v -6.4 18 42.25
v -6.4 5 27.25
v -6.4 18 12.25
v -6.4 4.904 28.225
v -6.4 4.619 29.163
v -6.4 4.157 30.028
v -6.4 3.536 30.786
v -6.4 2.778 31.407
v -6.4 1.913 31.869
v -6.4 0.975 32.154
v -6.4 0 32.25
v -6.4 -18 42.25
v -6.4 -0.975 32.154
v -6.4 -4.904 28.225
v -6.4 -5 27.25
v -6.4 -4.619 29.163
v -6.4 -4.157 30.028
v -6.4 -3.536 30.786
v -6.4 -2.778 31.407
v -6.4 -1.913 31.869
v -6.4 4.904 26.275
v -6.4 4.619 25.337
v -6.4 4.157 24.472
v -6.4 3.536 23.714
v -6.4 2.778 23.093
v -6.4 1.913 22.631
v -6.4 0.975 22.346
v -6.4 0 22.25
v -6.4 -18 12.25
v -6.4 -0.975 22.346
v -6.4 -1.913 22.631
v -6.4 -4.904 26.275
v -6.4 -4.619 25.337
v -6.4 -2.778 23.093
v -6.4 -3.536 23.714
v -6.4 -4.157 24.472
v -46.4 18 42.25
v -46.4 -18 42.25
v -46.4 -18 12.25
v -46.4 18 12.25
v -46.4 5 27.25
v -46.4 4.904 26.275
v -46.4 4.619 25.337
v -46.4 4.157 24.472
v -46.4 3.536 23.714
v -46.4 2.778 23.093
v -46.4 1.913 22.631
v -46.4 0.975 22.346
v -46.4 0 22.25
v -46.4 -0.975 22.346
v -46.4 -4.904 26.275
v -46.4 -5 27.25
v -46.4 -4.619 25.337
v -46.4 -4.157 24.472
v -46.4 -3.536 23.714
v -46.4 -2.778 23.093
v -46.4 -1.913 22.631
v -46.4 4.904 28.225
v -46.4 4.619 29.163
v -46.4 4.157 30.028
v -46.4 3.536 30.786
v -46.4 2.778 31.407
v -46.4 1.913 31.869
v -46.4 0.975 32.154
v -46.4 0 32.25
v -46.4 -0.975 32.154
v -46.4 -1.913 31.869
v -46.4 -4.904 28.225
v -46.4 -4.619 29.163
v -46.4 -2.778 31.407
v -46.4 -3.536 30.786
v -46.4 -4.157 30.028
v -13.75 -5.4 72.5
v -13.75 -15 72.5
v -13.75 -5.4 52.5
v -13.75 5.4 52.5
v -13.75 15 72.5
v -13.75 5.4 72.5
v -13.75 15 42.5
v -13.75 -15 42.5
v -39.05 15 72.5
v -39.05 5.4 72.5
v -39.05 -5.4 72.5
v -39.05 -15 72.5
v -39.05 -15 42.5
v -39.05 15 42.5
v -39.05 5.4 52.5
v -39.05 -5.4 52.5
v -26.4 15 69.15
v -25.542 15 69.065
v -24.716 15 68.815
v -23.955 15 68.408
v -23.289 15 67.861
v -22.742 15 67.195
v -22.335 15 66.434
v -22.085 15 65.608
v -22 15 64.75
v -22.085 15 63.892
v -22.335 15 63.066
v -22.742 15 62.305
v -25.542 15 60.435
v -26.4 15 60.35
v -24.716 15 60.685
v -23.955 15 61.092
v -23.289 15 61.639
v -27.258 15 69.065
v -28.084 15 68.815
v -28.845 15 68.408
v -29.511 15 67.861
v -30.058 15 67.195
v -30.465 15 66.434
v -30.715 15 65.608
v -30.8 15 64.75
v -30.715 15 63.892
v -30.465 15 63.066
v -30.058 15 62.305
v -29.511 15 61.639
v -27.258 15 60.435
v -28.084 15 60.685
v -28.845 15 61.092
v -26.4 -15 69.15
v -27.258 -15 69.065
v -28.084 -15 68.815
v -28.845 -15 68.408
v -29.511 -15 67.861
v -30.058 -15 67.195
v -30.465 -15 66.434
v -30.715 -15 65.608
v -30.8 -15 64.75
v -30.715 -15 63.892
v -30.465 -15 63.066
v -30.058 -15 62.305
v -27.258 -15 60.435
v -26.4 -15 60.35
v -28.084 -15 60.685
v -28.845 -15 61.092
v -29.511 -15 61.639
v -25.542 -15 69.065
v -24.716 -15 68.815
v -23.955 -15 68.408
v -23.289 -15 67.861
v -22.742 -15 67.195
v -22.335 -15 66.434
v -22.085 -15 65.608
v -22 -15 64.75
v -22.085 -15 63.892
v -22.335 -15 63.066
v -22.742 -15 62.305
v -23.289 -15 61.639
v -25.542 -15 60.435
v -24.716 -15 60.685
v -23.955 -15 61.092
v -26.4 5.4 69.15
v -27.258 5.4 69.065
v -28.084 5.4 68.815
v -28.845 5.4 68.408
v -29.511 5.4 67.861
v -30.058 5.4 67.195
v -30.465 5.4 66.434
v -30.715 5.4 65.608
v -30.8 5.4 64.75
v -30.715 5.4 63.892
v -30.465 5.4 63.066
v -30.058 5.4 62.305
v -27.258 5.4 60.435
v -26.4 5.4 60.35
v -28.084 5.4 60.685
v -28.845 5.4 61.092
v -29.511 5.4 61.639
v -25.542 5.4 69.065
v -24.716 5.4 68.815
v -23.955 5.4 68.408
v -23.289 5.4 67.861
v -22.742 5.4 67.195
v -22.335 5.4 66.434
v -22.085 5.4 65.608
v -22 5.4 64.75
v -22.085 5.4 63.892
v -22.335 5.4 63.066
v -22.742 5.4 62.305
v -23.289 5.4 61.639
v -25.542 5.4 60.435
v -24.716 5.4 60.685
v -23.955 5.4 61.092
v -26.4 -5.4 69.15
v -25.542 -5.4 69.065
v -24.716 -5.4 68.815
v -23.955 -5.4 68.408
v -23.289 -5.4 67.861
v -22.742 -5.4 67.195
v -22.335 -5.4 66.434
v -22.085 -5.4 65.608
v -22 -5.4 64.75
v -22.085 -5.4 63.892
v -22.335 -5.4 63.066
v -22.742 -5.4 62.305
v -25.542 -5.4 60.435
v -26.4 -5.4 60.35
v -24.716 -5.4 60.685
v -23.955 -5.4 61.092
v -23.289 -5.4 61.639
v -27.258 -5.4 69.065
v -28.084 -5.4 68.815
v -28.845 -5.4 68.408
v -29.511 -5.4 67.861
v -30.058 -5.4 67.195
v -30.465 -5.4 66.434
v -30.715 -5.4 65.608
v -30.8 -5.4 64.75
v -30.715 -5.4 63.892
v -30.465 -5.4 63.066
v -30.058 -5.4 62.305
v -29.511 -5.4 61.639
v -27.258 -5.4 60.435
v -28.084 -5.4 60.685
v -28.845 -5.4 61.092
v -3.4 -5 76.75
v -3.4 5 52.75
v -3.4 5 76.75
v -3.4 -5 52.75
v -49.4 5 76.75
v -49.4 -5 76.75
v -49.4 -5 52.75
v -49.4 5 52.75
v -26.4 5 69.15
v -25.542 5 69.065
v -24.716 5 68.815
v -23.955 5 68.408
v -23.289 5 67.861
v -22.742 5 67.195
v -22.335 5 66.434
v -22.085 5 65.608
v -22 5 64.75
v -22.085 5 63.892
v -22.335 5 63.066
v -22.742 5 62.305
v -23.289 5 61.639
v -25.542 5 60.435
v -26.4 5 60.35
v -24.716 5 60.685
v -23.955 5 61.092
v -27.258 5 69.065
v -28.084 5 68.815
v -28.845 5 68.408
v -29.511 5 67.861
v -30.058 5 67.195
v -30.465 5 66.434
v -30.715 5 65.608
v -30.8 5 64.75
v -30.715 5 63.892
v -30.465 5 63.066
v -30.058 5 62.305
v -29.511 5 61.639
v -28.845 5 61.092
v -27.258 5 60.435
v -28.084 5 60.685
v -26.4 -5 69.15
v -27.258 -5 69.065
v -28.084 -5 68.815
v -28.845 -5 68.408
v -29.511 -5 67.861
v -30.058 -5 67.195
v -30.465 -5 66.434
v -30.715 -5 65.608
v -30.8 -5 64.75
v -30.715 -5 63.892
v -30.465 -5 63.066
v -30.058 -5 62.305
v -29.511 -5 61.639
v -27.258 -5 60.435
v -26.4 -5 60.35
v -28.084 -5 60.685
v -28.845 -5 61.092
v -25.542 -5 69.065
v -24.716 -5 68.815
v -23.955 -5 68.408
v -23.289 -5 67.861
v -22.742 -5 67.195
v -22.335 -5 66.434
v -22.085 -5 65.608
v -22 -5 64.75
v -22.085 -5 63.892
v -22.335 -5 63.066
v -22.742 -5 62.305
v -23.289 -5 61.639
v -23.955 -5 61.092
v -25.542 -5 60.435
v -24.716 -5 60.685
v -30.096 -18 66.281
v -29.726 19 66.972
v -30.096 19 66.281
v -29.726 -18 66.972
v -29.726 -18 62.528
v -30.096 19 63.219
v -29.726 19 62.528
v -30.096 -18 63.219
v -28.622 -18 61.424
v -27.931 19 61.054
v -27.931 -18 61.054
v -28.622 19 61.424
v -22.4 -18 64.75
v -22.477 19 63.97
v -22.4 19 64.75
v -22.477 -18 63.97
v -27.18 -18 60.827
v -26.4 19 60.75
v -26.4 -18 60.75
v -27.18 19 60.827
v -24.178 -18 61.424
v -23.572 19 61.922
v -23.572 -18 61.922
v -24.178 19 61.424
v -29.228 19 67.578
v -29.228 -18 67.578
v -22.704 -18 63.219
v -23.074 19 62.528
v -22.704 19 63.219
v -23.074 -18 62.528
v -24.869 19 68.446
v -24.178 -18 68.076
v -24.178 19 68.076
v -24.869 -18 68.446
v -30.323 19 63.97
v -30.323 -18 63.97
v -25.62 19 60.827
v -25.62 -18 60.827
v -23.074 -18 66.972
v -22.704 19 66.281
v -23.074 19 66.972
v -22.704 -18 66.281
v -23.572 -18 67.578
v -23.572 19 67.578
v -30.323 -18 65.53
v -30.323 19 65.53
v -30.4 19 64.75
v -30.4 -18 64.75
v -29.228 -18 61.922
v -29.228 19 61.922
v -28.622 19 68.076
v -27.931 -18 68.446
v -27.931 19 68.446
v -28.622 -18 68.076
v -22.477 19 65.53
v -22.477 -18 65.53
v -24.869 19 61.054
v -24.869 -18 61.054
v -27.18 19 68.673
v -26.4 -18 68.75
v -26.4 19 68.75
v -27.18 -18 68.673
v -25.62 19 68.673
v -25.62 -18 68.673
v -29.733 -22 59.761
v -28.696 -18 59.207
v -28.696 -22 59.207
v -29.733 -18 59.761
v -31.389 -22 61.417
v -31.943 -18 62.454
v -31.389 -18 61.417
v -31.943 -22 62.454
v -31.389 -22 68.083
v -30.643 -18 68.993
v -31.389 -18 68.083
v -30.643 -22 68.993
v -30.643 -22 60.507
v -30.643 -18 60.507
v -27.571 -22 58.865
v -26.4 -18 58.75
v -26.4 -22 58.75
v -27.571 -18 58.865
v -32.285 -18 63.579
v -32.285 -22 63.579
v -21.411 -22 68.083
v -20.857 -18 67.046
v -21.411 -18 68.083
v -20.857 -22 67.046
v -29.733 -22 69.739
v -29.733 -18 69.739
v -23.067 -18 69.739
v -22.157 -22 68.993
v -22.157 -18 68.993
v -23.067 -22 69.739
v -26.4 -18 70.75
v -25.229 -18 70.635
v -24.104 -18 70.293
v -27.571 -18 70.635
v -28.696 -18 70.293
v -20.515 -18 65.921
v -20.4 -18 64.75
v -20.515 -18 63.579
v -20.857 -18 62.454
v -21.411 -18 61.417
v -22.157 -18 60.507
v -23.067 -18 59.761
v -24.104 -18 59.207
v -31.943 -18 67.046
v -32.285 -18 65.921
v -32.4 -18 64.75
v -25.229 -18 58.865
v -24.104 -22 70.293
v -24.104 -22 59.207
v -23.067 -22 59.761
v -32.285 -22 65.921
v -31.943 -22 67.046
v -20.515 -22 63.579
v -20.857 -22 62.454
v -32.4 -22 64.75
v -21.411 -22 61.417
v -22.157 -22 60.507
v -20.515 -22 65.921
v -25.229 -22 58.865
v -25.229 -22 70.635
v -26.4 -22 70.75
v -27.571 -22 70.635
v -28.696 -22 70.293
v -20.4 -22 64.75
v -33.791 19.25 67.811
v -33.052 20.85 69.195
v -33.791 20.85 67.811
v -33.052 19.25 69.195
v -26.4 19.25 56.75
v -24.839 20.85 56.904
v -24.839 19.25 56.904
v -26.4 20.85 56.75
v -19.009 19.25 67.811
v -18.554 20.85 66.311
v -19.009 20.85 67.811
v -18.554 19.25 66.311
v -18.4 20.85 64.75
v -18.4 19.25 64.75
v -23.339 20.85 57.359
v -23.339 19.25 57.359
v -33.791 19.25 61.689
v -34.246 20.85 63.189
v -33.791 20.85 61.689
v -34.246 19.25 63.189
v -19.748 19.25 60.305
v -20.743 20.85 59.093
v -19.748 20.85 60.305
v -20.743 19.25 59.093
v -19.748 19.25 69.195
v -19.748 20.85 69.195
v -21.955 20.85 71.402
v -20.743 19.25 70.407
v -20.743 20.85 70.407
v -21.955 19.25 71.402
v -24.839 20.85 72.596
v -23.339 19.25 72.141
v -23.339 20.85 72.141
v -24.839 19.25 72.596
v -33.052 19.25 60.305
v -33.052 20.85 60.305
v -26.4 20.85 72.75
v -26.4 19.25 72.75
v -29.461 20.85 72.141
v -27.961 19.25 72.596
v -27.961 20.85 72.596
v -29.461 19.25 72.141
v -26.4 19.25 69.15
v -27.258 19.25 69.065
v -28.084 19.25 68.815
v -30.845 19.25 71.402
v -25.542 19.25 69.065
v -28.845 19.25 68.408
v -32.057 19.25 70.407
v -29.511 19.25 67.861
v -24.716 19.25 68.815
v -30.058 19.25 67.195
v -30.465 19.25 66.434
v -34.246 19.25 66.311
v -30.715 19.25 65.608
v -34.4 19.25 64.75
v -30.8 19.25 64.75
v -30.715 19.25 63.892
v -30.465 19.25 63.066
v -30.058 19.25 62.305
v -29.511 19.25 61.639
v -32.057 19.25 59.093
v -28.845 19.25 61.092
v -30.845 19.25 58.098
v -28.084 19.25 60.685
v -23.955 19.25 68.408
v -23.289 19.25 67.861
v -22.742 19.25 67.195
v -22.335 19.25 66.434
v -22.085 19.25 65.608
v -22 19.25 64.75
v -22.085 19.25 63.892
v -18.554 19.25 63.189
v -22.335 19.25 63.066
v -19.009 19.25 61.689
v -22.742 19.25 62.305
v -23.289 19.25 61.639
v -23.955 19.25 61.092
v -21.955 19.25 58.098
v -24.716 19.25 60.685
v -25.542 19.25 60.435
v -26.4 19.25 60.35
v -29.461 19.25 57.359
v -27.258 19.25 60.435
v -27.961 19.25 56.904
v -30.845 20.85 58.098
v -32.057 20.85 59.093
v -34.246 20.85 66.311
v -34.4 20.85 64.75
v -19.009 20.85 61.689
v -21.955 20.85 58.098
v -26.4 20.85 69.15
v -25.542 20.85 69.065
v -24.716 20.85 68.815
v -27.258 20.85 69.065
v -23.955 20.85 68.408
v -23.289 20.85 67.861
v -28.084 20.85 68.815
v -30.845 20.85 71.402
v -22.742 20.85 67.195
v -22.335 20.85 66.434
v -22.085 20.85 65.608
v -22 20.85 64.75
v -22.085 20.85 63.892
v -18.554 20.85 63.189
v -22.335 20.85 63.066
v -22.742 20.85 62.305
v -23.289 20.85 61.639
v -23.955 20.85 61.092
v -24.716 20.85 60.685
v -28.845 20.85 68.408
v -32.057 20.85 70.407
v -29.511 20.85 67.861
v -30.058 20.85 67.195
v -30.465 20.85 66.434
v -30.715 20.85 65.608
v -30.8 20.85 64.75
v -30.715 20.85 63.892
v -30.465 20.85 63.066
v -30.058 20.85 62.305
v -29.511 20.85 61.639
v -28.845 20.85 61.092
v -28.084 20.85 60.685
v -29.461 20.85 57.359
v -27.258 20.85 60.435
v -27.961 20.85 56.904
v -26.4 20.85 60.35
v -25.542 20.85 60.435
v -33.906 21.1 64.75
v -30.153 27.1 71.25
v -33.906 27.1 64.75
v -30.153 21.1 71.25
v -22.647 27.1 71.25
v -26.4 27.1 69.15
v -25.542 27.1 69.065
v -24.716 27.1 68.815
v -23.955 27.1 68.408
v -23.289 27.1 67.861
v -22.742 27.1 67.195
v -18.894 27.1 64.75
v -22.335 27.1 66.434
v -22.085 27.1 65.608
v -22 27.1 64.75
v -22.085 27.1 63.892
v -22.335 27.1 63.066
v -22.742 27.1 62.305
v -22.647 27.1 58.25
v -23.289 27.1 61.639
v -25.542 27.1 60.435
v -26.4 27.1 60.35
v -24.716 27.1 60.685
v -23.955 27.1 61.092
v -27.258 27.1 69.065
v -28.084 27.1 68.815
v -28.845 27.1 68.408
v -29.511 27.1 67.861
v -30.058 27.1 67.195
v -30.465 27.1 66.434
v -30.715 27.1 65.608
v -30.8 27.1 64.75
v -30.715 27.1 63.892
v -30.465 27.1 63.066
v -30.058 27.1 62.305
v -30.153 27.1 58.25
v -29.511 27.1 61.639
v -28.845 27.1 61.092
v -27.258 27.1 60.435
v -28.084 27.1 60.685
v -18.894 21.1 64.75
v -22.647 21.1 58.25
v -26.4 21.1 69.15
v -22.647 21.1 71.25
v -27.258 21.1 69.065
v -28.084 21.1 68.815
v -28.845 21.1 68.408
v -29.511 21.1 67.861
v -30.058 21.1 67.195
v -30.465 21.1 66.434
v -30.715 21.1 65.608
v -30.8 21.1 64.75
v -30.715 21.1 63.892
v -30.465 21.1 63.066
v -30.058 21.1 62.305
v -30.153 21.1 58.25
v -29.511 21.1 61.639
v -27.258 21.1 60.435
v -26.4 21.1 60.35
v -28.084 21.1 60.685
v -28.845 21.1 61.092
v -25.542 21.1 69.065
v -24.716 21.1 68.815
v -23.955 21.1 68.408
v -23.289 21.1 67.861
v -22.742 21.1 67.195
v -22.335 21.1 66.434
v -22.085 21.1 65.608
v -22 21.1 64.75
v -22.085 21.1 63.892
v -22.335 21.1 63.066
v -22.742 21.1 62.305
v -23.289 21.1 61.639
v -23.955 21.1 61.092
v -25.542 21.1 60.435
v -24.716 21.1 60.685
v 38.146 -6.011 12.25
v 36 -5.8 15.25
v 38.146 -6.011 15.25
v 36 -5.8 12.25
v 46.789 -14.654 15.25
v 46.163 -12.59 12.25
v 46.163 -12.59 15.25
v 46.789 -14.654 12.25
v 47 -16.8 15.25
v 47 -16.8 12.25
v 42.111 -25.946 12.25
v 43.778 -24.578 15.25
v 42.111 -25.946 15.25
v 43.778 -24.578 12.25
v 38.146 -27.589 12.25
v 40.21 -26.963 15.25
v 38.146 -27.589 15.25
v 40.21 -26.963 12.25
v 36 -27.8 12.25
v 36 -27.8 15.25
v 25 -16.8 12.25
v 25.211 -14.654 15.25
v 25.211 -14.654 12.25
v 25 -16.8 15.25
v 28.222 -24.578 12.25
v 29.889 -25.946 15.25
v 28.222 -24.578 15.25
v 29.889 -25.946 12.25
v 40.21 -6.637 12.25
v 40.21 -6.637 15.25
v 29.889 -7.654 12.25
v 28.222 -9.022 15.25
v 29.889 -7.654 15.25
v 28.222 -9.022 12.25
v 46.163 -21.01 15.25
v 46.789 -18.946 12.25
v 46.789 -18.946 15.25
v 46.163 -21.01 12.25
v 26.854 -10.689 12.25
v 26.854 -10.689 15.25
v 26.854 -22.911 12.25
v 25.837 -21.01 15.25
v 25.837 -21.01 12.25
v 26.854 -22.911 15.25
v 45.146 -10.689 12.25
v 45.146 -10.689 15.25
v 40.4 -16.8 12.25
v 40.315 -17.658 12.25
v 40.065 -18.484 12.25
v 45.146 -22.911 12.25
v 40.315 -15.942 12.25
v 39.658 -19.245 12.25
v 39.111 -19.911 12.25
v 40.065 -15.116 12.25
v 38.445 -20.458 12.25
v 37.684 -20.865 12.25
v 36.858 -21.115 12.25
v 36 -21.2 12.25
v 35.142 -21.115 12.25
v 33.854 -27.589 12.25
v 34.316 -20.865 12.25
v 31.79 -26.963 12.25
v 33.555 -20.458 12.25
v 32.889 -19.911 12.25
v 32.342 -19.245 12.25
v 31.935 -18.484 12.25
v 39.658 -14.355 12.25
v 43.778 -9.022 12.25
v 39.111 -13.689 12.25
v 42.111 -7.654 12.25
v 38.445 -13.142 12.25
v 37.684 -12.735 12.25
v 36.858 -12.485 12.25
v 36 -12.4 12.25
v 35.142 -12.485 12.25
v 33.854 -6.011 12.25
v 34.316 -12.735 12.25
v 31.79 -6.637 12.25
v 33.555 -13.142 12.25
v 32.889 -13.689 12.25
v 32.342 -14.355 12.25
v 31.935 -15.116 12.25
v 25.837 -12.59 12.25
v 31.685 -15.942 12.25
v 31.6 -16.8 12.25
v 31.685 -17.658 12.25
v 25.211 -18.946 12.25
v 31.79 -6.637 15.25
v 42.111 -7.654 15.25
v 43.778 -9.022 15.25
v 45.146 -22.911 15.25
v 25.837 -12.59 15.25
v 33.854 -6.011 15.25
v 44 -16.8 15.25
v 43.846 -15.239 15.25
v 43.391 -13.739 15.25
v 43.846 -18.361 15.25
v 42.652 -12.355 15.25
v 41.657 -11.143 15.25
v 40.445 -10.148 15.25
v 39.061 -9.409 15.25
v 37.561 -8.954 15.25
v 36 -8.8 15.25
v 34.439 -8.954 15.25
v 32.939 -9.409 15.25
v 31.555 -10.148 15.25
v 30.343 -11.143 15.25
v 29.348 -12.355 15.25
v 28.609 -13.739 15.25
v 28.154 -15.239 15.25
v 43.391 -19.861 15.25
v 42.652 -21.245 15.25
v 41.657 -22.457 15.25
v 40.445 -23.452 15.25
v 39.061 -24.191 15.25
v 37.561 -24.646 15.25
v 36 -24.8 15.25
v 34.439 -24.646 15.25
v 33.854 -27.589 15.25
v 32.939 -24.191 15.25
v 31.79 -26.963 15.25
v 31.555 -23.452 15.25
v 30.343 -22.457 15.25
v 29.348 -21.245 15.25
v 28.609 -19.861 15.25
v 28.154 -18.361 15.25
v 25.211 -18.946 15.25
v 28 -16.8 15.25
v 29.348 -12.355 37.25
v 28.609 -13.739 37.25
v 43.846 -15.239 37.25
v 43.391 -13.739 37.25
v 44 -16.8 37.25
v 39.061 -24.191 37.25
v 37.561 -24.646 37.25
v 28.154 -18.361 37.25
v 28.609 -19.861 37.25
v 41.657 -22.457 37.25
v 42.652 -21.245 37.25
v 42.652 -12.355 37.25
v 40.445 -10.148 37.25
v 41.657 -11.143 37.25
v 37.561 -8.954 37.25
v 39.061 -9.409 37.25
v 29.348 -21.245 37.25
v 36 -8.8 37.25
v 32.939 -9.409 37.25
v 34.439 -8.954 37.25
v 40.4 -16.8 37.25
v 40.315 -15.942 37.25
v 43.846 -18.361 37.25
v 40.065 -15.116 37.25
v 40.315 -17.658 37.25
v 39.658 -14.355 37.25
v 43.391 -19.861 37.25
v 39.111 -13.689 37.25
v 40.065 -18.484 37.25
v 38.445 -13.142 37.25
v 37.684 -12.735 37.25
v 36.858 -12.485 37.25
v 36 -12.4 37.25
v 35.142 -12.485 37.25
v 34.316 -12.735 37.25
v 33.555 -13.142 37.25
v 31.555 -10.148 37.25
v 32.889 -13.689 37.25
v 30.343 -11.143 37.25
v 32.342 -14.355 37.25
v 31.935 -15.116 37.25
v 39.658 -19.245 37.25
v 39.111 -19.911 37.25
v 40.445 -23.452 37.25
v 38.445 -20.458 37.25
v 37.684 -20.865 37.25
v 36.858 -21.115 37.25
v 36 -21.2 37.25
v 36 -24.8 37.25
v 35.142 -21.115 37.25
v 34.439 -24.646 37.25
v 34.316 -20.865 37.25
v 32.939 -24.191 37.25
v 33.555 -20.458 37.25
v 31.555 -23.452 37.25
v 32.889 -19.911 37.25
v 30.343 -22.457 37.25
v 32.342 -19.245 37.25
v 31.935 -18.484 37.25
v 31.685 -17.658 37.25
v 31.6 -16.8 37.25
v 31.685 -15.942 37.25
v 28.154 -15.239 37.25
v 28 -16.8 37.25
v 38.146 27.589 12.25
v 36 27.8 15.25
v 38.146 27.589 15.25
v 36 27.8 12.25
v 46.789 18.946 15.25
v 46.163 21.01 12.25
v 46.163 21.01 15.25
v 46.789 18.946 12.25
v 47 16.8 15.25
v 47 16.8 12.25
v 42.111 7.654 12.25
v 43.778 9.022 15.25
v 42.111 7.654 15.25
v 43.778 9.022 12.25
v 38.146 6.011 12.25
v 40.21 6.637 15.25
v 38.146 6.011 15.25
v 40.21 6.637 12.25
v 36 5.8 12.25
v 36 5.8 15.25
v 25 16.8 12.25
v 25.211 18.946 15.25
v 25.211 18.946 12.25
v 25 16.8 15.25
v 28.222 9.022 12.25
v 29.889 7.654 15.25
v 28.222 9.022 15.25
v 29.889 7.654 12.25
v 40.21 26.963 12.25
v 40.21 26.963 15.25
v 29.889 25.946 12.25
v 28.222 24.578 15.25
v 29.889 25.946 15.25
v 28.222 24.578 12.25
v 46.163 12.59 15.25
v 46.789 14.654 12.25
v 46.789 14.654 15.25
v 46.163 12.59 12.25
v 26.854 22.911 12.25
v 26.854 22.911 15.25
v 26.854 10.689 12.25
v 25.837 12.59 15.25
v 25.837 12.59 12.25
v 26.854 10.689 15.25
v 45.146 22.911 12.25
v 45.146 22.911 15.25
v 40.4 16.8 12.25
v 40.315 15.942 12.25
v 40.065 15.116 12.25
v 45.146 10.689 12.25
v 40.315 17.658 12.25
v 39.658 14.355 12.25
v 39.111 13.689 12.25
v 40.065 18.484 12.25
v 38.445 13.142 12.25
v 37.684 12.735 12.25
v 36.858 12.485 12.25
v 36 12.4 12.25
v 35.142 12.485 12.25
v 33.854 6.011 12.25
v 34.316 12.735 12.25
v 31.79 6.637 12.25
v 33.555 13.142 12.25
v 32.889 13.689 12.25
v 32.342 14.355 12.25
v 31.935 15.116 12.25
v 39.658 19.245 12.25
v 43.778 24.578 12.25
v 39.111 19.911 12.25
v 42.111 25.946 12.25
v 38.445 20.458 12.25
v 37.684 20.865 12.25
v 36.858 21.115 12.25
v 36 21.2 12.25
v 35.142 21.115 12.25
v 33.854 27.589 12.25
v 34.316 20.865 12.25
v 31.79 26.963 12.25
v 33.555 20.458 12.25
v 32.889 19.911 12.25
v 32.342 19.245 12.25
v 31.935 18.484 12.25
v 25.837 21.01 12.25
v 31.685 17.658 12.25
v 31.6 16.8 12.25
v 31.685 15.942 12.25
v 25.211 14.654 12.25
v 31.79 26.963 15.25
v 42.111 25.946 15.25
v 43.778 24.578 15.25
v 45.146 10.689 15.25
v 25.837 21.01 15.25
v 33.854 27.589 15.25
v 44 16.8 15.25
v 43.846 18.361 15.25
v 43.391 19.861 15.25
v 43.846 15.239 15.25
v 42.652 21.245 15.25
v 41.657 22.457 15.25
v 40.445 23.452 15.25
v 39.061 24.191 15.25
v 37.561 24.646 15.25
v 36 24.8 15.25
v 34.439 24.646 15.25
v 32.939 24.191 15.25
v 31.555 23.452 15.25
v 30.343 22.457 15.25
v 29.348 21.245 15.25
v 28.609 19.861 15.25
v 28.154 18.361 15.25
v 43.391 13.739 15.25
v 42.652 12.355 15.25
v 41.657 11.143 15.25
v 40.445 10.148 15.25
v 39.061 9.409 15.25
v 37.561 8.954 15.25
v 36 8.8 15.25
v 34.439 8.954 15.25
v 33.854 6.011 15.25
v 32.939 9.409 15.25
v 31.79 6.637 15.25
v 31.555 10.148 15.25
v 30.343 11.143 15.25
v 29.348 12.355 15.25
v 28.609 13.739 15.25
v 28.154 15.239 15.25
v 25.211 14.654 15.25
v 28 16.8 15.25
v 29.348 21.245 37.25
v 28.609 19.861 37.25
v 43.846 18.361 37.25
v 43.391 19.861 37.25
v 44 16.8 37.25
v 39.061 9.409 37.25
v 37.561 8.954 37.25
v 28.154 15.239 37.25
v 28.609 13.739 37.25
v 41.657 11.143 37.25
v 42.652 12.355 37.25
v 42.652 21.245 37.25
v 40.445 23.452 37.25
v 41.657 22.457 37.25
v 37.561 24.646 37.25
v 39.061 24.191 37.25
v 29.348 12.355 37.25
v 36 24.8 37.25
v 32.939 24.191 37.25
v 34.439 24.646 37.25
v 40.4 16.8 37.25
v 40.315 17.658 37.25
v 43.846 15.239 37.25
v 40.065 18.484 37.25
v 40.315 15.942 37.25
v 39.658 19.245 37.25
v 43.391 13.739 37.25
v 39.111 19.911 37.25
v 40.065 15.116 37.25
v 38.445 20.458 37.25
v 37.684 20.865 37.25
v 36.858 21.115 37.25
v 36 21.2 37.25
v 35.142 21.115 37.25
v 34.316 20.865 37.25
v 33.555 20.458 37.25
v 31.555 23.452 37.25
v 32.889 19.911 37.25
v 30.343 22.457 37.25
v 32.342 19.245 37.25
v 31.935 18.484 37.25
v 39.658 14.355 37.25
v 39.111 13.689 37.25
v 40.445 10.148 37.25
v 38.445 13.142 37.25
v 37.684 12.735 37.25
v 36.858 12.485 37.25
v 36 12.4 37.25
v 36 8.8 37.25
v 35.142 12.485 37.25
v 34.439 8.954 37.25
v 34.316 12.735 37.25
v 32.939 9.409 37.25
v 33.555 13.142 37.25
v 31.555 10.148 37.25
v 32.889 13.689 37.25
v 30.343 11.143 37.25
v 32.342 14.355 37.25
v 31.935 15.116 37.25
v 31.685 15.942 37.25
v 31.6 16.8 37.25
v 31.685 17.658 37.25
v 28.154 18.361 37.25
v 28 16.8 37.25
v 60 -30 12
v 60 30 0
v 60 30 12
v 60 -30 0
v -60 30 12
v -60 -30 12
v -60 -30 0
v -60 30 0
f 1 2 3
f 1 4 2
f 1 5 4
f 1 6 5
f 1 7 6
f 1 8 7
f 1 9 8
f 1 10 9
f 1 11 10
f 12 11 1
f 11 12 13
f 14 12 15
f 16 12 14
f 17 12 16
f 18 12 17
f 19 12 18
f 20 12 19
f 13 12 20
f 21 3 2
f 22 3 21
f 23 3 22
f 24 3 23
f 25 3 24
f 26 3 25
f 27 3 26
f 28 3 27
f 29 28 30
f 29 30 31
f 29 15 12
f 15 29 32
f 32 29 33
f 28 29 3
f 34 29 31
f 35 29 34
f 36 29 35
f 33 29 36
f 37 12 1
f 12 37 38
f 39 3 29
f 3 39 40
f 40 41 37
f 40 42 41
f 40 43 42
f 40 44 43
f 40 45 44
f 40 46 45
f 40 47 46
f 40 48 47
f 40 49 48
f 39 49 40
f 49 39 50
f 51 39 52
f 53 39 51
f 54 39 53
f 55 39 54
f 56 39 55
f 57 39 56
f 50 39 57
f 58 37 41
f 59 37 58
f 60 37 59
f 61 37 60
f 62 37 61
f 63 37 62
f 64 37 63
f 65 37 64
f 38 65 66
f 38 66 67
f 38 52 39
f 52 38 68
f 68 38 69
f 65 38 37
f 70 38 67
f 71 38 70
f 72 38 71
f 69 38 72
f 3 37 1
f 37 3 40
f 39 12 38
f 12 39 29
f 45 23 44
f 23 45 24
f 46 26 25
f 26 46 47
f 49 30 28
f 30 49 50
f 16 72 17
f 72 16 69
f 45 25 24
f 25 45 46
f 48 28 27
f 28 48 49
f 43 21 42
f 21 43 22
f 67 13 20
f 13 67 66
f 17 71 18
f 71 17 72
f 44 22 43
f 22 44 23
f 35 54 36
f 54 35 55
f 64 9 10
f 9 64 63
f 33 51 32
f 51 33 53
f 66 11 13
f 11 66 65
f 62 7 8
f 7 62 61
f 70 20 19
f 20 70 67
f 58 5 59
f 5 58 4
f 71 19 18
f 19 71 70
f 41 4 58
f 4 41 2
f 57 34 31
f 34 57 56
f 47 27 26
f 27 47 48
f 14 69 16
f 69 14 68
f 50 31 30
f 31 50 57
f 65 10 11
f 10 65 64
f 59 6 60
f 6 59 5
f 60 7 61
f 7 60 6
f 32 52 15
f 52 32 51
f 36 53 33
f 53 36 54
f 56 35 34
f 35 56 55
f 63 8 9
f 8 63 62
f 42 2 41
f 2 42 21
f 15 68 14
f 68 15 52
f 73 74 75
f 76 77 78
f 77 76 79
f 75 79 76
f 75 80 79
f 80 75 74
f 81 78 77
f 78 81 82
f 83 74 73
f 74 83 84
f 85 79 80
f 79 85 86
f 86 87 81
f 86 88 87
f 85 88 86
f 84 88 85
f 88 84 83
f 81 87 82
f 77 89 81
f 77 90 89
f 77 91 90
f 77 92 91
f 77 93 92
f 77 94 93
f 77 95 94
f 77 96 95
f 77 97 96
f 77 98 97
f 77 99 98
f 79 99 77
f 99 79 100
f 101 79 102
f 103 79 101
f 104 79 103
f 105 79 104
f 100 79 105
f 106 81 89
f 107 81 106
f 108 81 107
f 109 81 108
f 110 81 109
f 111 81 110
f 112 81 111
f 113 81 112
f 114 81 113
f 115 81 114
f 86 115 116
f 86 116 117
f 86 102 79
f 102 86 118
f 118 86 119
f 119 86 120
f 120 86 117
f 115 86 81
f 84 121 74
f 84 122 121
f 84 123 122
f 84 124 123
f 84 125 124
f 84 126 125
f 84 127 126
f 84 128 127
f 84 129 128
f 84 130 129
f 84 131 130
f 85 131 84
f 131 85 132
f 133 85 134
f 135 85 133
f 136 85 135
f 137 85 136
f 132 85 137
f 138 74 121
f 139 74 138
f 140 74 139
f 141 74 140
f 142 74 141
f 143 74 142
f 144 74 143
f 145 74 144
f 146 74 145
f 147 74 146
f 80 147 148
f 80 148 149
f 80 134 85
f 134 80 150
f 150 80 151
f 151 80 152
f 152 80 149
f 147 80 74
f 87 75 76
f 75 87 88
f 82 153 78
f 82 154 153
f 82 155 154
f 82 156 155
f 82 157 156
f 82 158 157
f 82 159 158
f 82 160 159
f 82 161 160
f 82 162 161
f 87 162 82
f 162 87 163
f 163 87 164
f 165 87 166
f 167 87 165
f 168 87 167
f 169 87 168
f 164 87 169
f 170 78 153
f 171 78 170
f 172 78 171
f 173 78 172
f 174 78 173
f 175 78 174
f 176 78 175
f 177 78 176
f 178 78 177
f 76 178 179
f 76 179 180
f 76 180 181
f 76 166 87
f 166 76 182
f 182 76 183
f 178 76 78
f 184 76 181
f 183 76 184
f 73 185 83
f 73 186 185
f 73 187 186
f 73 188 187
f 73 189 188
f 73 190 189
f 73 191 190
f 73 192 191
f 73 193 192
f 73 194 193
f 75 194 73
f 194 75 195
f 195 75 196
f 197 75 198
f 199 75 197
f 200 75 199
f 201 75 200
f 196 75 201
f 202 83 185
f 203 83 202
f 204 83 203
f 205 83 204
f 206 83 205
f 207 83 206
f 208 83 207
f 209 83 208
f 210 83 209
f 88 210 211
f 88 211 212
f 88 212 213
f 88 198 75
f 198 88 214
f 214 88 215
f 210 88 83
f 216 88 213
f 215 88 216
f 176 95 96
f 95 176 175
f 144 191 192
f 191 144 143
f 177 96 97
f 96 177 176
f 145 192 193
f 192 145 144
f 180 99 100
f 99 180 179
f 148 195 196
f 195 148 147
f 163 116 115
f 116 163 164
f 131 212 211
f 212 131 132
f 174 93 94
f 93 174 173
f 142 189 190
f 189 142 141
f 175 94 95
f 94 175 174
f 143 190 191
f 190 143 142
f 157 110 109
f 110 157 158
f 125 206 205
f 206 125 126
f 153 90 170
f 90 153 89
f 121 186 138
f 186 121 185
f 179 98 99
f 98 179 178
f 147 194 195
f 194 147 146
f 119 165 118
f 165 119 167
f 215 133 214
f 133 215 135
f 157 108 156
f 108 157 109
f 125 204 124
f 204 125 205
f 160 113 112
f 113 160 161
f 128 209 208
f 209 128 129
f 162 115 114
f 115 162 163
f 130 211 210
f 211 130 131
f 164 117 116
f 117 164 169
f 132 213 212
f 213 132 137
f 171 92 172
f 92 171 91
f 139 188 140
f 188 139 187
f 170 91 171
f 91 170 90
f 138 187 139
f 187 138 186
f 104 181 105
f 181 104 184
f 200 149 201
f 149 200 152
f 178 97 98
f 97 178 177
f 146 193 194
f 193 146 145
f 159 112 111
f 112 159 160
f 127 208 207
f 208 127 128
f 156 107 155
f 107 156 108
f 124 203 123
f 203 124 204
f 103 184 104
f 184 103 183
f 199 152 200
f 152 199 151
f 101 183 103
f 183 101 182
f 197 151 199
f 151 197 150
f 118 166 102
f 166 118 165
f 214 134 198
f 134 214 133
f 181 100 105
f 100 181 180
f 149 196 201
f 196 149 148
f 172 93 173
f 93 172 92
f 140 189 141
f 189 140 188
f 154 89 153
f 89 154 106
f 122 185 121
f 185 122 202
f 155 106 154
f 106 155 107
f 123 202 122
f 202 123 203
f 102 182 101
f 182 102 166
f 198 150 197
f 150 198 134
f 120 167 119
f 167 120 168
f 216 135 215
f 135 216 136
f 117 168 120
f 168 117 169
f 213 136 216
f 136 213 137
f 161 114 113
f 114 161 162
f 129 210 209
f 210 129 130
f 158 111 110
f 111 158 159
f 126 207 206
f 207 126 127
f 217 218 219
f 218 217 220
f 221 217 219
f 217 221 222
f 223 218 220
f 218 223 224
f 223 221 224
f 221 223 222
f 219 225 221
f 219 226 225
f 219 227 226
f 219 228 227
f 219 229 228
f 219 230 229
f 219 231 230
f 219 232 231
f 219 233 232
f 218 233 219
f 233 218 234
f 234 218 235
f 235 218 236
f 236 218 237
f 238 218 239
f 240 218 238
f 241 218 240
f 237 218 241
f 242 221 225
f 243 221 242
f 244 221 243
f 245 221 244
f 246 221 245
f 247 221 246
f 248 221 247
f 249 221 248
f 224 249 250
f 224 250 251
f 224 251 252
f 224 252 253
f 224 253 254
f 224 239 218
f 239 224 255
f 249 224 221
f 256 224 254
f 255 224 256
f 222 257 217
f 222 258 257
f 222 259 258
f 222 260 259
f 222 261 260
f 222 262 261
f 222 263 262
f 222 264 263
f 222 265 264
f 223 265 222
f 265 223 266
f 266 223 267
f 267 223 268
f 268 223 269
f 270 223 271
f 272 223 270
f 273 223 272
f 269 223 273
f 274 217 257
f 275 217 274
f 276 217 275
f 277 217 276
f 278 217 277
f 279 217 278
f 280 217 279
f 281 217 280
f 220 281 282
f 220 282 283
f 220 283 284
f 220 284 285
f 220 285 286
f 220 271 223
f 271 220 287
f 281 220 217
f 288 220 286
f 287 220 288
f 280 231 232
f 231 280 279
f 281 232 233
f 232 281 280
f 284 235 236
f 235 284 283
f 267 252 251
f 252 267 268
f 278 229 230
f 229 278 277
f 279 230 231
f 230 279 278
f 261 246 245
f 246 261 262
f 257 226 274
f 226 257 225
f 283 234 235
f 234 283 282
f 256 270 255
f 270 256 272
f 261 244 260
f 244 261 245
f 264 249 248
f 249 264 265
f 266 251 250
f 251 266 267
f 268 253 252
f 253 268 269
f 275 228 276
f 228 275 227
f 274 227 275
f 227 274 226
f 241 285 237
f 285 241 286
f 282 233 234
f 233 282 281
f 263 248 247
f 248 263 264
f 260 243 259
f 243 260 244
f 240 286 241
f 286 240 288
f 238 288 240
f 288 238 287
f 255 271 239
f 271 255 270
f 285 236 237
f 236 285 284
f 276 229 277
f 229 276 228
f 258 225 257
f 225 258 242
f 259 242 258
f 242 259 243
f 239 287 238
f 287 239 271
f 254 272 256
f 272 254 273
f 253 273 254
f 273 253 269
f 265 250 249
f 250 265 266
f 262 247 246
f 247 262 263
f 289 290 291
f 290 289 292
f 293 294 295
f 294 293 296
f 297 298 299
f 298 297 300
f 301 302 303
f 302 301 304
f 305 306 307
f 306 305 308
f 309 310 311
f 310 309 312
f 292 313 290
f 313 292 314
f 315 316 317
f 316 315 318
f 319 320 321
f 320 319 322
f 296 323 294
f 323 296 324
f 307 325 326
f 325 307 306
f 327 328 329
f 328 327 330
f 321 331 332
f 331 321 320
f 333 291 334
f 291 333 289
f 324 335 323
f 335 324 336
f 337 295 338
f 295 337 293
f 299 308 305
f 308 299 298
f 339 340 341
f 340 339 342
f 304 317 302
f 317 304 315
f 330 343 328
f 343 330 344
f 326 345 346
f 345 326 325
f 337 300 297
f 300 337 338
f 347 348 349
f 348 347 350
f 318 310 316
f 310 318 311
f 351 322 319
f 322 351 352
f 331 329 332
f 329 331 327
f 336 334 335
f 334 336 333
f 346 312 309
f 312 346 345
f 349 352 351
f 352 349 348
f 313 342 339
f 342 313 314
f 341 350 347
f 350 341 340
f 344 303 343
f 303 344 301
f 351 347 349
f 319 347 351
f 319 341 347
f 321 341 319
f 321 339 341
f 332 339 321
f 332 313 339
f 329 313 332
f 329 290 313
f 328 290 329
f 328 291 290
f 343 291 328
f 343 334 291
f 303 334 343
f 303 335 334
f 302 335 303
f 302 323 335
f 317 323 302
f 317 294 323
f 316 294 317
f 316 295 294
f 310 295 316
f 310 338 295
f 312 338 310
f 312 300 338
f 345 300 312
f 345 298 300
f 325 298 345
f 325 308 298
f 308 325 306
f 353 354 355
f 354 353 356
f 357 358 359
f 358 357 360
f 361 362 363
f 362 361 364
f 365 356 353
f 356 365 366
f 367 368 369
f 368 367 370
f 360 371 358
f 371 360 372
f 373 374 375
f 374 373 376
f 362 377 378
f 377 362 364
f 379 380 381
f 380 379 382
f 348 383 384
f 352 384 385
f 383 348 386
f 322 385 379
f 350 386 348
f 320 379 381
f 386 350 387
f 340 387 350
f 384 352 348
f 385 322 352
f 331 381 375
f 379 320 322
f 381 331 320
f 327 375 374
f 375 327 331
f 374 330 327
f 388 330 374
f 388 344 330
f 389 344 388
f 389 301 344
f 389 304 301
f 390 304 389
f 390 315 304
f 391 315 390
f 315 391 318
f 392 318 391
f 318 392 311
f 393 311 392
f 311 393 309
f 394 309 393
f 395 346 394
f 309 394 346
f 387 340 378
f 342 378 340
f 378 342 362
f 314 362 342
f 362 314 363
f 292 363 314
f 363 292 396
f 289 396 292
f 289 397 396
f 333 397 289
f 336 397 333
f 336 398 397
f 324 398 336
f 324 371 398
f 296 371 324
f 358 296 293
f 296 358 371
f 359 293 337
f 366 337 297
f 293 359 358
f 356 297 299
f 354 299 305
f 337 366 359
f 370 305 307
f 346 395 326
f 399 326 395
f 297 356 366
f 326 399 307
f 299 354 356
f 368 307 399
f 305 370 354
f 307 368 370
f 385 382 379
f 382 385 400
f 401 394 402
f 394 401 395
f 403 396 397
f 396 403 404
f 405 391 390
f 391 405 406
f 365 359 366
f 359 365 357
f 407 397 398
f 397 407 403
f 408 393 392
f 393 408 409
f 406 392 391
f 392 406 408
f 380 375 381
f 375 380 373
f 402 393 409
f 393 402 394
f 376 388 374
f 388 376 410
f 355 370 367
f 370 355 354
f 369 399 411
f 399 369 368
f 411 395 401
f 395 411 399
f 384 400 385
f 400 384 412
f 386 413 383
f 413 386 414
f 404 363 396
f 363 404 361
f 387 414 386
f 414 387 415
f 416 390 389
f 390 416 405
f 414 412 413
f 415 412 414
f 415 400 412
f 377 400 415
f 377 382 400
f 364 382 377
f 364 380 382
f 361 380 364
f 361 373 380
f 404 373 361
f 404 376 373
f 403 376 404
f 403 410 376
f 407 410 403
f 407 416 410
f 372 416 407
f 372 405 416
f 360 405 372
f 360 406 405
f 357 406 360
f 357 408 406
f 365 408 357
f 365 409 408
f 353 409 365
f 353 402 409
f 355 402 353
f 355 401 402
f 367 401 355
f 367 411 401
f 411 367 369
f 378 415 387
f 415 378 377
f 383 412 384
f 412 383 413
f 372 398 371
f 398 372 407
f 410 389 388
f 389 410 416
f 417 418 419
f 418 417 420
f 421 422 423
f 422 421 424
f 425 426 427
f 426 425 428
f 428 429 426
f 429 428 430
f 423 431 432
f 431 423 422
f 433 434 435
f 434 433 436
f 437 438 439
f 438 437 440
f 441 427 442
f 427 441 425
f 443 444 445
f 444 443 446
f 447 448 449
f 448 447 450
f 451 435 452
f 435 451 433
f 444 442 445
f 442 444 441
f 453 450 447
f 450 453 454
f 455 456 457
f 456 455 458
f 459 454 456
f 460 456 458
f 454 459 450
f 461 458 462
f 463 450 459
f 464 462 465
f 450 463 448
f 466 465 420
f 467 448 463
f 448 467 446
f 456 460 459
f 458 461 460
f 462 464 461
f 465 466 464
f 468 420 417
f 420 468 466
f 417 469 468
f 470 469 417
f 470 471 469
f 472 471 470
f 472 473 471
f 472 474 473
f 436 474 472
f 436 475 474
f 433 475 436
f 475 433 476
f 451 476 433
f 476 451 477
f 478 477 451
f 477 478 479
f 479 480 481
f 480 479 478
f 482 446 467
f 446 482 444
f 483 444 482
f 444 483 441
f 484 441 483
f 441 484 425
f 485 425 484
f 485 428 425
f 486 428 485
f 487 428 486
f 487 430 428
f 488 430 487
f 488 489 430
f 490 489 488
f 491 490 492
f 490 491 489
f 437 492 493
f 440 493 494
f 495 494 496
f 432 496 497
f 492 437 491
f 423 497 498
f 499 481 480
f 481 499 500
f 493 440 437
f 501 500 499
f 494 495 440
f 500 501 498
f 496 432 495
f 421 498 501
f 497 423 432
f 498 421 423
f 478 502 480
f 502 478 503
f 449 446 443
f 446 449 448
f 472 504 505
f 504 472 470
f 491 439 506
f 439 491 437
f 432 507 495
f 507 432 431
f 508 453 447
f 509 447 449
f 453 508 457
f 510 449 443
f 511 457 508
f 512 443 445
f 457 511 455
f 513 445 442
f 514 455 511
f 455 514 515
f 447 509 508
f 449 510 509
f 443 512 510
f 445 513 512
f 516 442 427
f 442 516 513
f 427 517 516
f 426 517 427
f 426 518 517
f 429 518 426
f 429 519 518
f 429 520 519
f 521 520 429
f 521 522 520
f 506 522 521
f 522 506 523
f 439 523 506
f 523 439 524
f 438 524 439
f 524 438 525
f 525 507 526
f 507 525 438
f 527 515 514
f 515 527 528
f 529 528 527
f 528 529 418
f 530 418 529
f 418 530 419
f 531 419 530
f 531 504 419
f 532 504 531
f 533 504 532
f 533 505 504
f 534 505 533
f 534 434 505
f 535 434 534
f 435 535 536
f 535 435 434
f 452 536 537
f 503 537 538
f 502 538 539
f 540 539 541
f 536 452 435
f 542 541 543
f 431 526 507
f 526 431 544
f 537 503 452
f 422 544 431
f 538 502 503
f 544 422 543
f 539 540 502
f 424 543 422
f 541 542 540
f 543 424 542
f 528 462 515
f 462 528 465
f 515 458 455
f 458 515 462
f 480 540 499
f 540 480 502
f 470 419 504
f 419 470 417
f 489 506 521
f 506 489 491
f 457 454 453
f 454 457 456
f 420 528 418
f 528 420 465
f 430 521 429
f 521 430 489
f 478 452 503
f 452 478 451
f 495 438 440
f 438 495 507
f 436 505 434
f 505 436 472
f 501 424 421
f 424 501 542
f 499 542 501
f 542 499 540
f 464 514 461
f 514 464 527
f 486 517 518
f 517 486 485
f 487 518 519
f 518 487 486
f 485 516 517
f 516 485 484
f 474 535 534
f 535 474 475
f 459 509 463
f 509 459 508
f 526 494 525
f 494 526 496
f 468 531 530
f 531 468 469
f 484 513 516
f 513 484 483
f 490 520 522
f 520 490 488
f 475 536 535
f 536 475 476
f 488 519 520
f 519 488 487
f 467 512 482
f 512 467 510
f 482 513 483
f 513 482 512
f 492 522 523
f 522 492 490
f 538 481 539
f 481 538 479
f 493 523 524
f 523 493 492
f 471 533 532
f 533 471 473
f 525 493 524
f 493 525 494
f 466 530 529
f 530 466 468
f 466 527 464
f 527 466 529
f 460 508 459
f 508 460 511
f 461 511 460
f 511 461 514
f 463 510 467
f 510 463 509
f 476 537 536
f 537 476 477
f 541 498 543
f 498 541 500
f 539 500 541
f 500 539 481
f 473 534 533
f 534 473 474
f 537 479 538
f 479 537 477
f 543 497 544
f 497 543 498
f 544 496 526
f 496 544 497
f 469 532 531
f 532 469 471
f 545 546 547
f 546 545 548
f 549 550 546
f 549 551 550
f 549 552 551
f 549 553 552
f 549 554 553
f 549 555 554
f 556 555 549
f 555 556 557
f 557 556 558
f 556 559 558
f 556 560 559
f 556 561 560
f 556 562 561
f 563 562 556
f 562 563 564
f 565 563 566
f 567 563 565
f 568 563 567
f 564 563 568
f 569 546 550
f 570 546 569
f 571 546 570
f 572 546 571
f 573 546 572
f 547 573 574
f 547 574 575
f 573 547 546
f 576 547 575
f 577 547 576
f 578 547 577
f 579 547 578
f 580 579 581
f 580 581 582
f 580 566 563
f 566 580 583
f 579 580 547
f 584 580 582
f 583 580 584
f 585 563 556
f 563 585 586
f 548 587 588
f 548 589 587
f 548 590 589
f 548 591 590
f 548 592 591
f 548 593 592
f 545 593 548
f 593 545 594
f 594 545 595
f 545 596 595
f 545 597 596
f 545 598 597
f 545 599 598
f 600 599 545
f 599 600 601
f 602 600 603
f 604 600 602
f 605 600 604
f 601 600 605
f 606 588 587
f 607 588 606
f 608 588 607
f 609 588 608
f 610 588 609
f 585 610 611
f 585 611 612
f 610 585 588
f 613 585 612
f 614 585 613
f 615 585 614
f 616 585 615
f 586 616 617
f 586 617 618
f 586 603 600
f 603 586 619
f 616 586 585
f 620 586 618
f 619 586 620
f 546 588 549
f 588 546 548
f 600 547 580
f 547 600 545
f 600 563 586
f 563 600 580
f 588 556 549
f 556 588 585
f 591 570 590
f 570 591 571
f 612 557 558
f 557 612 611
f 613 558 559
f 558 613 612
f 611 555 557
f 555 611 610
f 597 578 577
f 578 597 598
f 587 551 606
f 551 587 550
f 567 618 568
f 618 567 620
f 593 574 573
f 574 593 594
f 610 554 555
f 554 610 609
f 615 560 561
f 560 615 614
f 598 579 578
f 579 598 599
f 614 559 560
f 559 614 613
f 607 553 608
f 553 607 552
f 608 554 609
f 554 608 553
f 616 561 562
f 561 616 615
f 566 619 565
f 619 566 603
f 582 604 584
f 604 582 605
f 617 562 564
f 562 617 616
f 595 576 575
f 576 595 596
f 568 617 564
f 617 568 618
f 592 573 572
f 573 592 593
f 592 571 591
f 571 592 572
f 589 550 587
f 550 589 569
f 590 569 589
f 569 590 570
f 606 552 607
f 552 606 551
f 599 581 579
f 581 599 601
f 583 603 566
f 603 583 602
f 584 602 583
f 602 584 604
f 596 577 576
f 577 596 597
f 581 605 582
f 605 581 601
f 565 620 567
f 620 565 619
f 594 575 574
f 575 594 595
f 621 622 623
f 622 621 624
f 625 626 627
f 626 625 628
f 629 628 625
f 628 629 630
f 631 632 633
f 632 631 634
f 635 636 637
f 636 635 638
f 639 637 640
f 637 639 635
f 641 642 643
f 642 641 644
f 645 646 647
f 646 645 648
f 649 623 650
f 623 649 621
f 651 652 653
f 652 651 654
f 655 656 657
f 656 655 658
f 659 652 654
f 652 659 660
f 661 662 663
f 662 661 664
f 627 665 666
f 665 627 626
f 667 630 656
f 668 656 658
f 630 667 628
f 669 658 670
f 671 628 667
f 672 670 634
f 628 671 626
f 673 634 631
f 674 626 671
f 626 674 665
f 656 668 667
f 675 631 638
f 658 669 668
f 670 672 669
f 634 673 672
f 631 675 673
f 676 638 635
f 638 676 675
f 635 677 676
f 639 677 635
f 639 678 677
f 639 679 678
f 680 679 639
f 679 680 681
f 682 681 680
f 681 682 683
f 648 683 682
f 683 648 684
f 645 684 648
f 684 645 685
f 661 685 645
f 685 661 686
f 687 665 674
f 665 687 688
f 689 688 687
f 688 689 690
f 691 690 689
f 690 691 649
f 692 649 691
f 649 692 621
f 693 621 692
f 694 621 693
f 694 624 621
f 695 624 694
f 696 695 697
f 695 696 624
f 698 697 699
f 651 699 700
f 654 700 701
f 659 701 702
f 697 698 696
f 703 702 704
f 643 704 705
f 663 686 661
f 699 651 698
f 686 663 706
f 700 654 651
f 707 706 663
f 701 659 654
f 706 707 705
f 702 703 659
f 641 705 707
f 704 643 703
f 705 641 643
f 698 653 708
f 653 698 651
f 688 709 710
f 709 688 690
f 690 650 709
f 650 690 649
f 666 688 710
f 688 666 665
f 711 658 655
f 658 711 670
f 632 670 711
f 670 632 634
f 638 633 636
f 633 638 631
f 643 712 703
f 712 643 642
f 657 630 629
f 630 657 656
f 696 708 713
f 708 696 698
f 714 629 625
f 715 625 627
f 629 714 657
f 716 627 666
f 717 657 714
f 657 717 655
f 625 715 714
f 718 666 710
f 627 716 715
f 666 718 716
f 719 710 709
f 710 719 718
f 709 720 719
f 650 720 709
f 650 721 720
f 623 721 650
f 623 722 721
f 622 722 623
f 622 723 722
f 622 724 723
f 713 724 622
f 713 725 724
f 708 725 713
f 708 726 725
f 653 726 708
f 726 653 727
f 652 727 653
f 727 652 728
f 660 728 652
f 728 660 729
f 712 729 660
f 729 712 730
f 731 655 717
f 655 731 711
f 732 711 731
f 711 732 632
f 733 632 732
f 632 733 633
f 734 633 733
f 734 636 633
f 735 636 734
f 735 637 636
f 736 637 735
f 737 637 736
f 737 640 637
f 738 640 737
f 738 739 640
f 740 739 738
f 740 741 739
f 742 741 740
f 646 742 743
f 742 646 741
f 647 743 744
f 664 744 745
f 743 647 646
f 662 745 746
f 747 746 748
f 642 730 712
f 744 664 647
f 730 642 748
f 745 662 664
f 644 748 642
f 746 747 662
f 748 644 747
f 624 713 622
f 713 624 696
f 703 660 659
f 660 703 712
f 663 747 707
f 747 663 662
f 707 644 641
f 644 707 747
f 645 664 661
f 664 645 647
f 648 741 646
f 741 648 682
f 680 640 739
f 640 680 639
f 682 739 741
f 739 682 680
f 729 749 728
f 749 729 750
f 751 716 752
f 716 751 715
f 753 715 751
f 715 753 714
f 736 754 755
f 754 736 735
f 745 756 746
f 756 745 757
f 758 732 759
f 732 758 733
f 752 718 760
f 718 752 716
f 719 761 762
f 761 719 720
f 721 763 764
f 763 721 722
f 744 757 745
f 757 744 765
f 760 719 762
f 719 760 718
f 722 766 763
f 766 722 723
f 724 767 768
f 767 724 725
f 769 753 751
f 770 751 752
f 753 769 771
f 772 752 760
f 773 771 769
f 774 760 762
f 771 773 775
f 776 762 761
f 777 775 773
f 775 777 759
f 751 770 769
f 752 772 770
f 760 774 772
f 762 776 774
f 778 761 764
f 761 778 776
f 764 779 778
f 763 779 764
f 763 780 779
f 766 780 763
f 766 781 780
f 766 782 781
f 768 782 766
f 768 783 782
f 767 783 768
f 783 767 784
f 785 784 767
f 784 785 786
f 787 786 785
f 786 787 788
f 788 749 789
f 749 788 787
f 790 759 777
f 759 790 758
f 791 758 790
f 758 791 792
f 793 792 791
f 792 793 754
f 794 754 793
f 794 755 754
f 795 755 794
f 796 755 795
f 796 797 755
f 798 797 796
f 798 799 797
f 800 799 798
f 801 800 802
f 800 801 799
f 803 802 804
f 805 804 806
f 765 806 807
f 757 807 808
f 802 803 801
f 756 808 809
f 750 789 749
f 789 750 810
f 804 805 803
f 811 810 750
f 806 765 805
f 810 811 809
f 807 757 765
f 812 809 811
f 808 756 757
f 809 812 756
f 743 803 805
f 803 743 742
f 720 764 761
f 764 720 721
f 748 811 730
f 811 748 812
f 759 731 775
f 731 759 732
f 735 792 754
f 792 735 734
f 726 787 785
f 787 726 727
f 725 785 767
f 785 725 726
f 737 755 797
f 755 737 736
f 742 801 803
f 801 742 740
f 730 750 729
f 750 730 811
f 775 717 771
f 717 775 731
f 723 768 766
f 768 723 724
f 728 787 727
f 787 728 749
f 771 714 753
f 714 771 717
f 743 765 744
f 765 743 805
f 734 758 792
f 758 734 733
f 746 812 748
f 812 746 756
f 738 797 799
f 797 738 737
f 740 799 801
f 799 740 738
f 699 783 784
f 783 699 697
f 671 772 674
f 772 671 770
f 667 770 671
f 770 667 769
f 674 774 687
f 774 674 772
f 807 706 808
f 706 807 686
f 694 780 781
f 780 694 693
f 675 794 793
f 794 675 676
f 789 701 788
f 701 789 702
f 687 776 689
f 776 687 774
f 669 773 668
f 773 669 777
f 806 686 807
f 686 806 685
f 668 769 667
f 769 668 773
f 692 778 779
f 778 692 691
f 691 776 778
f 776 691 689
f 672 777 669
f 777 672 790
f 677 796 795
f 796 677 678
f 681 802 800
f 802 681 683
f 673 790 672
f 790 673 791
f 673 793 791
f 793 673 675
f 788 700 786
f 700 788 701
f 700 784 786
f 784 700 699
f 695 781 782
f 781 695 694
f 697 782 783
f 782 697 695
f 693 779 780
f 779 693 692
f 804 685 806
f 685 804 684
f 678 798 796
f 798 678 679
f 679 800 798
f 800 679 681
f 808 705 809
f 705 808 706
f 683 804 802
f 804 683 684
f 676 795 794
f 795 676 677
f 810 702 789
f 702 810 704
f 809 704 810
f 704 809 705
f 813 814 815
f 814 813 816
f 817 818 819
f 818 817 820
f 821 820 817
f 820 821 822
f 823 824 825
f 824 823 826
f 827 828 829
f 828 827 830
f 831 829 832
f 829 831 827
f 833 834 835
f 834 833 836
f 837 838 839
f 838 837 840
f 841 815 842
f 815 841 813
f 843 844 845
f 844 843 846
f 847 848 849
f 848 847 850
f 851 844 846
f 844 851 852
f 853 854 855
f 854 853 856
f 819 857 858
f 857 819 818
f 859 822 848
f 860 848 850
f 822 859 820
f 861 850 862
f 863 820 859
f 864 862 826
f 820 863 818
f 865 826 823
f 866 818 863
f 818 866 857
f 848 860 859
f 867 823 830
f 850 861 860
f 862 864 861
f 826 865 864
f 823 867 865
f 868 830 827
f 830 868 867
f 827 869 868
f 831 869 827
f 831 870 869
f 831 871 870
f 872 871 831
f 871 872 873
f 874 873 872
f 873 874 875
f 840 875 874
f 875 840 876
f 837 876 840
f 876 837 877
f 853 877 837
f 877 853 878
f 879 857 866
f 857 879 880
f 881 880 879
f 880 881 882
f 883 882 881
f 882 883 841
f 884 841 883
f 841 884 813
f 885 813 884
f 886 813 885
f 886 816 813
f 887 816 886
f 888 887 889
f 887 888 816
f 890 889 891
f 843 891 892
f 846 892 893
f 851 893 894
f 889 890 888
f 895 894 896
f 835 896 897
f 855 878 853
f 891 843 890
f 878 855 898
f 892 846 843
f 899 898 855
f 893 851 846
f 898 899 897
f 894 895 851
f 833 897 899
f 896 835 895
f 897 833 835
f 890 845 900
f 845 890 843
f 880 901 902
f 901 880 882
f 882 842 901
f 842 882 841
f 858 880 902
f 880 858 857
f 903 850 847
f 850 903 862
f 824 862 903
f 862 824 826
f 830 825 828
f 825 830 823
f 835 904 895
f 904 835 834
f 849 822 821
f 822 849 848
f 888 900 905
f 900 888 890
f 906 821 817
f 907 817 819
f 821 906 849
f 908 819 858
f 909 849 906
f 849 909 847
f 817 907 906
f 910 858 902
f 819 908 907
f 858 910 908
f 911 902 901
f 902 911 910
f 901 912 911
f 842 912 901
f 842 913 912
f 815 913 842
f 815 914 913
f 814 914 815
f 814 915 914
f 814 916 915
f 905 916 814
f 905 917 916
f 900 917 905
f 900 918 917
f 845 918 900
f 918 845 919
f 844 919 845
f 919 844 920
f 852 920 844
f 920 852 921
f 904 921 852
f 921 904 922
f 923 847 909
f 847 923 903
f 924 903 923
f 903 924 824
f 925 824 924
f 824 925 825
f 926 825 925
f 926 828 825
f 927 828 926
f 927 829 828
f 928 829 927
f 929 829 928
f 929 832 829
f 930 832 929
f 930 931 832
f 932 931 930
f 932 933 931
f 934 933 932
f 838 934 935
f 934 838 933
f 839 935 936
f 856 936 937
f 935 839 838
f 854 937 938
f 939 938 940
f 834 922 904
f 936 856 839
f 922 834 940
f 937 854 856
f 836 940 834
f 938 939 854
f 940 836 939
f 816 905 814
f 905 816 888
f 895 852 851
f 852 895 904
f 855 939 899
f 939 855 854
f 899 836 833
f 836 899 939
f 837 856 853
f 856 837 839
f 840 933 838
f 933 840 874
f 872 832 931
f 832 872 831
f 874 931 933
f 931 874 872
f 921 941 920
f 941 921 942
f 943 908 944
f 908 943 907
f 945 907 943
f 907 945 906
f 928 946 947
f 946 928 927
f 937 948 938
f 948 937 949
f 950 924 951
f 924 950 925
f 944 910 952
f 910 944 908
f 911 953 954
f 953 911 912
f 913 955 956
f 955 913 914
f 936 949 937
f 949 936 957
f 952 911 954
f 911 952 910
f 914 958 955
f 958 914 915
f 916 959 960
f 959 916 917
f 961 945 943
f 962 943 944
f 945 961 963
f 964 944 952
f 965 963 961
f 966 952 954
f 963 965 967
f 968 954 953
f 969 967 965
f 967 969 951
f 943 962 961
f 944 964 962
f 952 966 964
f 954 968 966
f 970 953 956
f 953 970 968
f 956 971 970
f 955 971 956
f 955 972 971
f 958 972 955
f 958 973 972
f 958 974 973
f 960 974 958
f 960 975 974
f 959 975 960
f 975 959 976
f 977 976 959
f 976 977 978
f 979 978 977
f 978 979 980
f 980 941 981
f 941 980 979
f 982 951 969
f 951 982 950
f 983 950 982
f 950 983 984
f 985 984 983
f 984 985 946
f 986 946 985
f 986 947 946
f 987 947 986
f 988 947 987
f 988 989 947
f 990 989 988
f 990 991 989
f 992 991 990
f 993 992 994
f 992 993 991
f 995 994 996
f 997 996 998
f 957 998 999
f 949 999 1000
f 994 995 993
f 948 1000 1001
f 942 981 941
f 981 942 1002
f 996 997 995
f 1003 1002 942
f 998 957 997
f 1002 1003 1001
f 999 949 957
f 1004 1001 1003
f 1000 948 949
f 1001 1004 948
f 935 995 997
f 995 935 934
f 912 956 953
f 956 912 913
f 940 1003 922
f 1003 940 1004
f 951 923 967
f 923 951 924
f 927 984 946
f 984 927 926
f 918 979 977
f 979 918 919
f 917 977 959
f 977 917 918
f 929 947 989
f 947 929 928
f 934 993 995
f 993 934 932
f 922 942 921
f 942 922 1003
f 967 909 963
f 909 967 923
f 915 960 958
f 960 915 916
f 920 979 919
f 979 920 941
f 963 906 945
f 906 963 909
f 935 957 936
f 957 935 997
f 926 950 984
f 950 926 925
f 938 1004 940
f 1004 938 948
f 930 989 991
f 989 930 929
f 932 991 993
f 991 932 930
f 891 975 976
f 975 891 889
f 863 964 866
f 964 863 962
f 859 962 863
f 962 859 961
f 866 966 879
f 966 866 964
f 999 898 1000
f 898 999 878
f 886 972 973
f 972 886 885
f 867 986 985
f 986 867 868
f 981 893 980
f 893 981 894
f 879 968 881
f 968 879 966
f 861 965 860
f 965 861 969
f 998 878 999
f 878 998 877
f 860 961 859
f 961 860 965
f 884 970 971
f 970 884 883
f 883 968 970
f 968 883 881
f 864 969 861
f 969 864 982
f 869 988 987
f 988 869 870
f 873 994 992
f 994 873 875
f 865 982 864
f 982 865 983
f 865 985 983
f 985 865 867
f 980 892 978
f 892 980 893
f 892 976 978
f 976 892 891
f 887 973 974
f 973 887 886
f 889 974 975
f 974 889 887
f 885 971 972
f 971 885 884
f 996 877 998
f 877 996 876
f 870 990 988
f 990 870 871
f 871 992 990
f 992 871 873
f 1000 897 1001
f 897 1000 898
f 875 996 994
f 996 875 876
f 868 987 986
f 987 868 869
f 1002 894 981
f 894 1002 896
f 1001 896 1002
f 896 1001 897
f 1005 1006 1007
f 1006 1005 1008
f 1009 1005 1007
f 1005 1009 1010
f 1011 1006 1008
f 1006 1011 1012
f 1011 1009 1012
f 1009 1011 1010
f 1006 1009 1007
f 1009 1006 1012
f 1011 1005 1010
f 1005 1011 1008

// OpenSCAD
$fn = 32;

// ------------------------------------------------------------------------
// Indexing jig: plate 120 x 60 mm, pin d8
// Every part is its own module, assembly() places every instance.
// ------------------------------------------------------------------------

// --- part 1 ---
module jig_plate() {
  difference() {
    translate([-60, -30, 0]) cube([120, 60, 12]);
  }
}

// --- part 2 ---
module locator_block() {
  difference() {
    translate([-20, -18, 0]) cube([40, 36, 30]);
    translate([0, 0, 15]) rotate([0, 90, 0]) cylinder(h = 42, d = 10, center = true);
  }
}

// --- part 3 ---
module index_fork() {
  difference() {
    translate([-12.65, -15, 0]) cube([25.3, 30, 30]);
    translate([-13.65, -5.4, 10]) cube([27.3, 10.8, 21]);
    translate([0, 0, 22.25]) rotate([90, 0, 0]) cylinder(h = 32, d = 8.8, center = true);
  }
}

// --- part 4 ---
module index_arm() {
  difference() {
    translate([-23, -5, 0]) cube([46, 10, 24]);
    translate([0, 0, 12]) rotate([90, 0, 0]) cylinder(h = 12, d = 8.8, center = true);
  }
}

// --- part 5 ---
module index_pin() {
  rotate([0, 90, 0]) cylinder(h = 38, d = 8, center = true);
  translate([-22, 0, 0]) rotate([0, 90, 0]) cylinder(h = 4, d = 12);
}

// --- part 6 ---
module pin_washer() {
  difference() {
      translate([0, 0, 0]) cylinder(h = 1.6, d = 16);
      translate([0, 0, -1]) cylinder(h = 3.6, d = 8.8);
    }
}

// --- part 7 ---
module lock_nut() {
  difference() {
    linear_extrude(height = 6) polygon(points = [[7.506, 0], [3.753, 6.5], [-3.753, 6.5], [-7.506, 0], [-3.753, -6.5], [3.753, -6.5]]);
    translate([0, 0, -1]) cylinder(h = 8, d = 8.8);
  }
}

// --- part 8 ---
module guide_bush_a() {
  difference() {
    union() {
      cylinder(h = 3, d = 22);
      translate([0, 0, 3]) cylinder(h = 22, d = 16);
    }
    translate([0, 0, -1]) cylinder(h = 27, d = 8.8);
  }
}

// --- part 9 ---
module guide_bush_b() {
  difference() {
    union() {
      cylinder(h = 3, d = 22);
      translate([0, 0, 3]) cylinder(h = 22, d = 16);
    }
    translate([0, 0, -1]) cylinder(h = 27, d = 8.8);
  }
}

// --- assembly ---
module assembly() {
  color([0.80, 0.24, 0.20]) translate([0, 0, 0]) rotate([0, 0, 0]) jig_plate();
  color([0.20, 0.45, 0.75]) translate([-26.4, 0, 12.25]) rotate([0, 0, 0]) locator_block();
  color([0.25, 0.62, 0.32]) translate([-26.4, 0, 42.5]) rotate([0, 0, 0]) index_fork();
  color([0.92, 0.70, 0.18]) translate([-26.4, 0, 52.75]) rotate([0, 0, 0]) index_arm();
  color([0.58, 0.35, 0.70]) translate([-26.4, 0, 64.75]) rotate([0, 0, 90]) index_pin();
  color([0.16, 0.66, 0.66]) translate([-26.4, 20.85, 64.75]) rotate([90, 0, 0]) pin_washer();
  color([0.85, 0.48, 0.18]) translate([-26.4, 27.1, 64.75]) rotate([90, 0, 0]) lock_nut();
  color([0.55, 0.60, 0.65]) translate([36, -16.8, 12.25]) rotate([0, 0, 0]) guide_bush_a();
  color([0.75, 0.30, 0.55]) translate([36, 16.8, 12.25]) rotate([0, 0, 0]) guide_bush_b();
}

assembly();
